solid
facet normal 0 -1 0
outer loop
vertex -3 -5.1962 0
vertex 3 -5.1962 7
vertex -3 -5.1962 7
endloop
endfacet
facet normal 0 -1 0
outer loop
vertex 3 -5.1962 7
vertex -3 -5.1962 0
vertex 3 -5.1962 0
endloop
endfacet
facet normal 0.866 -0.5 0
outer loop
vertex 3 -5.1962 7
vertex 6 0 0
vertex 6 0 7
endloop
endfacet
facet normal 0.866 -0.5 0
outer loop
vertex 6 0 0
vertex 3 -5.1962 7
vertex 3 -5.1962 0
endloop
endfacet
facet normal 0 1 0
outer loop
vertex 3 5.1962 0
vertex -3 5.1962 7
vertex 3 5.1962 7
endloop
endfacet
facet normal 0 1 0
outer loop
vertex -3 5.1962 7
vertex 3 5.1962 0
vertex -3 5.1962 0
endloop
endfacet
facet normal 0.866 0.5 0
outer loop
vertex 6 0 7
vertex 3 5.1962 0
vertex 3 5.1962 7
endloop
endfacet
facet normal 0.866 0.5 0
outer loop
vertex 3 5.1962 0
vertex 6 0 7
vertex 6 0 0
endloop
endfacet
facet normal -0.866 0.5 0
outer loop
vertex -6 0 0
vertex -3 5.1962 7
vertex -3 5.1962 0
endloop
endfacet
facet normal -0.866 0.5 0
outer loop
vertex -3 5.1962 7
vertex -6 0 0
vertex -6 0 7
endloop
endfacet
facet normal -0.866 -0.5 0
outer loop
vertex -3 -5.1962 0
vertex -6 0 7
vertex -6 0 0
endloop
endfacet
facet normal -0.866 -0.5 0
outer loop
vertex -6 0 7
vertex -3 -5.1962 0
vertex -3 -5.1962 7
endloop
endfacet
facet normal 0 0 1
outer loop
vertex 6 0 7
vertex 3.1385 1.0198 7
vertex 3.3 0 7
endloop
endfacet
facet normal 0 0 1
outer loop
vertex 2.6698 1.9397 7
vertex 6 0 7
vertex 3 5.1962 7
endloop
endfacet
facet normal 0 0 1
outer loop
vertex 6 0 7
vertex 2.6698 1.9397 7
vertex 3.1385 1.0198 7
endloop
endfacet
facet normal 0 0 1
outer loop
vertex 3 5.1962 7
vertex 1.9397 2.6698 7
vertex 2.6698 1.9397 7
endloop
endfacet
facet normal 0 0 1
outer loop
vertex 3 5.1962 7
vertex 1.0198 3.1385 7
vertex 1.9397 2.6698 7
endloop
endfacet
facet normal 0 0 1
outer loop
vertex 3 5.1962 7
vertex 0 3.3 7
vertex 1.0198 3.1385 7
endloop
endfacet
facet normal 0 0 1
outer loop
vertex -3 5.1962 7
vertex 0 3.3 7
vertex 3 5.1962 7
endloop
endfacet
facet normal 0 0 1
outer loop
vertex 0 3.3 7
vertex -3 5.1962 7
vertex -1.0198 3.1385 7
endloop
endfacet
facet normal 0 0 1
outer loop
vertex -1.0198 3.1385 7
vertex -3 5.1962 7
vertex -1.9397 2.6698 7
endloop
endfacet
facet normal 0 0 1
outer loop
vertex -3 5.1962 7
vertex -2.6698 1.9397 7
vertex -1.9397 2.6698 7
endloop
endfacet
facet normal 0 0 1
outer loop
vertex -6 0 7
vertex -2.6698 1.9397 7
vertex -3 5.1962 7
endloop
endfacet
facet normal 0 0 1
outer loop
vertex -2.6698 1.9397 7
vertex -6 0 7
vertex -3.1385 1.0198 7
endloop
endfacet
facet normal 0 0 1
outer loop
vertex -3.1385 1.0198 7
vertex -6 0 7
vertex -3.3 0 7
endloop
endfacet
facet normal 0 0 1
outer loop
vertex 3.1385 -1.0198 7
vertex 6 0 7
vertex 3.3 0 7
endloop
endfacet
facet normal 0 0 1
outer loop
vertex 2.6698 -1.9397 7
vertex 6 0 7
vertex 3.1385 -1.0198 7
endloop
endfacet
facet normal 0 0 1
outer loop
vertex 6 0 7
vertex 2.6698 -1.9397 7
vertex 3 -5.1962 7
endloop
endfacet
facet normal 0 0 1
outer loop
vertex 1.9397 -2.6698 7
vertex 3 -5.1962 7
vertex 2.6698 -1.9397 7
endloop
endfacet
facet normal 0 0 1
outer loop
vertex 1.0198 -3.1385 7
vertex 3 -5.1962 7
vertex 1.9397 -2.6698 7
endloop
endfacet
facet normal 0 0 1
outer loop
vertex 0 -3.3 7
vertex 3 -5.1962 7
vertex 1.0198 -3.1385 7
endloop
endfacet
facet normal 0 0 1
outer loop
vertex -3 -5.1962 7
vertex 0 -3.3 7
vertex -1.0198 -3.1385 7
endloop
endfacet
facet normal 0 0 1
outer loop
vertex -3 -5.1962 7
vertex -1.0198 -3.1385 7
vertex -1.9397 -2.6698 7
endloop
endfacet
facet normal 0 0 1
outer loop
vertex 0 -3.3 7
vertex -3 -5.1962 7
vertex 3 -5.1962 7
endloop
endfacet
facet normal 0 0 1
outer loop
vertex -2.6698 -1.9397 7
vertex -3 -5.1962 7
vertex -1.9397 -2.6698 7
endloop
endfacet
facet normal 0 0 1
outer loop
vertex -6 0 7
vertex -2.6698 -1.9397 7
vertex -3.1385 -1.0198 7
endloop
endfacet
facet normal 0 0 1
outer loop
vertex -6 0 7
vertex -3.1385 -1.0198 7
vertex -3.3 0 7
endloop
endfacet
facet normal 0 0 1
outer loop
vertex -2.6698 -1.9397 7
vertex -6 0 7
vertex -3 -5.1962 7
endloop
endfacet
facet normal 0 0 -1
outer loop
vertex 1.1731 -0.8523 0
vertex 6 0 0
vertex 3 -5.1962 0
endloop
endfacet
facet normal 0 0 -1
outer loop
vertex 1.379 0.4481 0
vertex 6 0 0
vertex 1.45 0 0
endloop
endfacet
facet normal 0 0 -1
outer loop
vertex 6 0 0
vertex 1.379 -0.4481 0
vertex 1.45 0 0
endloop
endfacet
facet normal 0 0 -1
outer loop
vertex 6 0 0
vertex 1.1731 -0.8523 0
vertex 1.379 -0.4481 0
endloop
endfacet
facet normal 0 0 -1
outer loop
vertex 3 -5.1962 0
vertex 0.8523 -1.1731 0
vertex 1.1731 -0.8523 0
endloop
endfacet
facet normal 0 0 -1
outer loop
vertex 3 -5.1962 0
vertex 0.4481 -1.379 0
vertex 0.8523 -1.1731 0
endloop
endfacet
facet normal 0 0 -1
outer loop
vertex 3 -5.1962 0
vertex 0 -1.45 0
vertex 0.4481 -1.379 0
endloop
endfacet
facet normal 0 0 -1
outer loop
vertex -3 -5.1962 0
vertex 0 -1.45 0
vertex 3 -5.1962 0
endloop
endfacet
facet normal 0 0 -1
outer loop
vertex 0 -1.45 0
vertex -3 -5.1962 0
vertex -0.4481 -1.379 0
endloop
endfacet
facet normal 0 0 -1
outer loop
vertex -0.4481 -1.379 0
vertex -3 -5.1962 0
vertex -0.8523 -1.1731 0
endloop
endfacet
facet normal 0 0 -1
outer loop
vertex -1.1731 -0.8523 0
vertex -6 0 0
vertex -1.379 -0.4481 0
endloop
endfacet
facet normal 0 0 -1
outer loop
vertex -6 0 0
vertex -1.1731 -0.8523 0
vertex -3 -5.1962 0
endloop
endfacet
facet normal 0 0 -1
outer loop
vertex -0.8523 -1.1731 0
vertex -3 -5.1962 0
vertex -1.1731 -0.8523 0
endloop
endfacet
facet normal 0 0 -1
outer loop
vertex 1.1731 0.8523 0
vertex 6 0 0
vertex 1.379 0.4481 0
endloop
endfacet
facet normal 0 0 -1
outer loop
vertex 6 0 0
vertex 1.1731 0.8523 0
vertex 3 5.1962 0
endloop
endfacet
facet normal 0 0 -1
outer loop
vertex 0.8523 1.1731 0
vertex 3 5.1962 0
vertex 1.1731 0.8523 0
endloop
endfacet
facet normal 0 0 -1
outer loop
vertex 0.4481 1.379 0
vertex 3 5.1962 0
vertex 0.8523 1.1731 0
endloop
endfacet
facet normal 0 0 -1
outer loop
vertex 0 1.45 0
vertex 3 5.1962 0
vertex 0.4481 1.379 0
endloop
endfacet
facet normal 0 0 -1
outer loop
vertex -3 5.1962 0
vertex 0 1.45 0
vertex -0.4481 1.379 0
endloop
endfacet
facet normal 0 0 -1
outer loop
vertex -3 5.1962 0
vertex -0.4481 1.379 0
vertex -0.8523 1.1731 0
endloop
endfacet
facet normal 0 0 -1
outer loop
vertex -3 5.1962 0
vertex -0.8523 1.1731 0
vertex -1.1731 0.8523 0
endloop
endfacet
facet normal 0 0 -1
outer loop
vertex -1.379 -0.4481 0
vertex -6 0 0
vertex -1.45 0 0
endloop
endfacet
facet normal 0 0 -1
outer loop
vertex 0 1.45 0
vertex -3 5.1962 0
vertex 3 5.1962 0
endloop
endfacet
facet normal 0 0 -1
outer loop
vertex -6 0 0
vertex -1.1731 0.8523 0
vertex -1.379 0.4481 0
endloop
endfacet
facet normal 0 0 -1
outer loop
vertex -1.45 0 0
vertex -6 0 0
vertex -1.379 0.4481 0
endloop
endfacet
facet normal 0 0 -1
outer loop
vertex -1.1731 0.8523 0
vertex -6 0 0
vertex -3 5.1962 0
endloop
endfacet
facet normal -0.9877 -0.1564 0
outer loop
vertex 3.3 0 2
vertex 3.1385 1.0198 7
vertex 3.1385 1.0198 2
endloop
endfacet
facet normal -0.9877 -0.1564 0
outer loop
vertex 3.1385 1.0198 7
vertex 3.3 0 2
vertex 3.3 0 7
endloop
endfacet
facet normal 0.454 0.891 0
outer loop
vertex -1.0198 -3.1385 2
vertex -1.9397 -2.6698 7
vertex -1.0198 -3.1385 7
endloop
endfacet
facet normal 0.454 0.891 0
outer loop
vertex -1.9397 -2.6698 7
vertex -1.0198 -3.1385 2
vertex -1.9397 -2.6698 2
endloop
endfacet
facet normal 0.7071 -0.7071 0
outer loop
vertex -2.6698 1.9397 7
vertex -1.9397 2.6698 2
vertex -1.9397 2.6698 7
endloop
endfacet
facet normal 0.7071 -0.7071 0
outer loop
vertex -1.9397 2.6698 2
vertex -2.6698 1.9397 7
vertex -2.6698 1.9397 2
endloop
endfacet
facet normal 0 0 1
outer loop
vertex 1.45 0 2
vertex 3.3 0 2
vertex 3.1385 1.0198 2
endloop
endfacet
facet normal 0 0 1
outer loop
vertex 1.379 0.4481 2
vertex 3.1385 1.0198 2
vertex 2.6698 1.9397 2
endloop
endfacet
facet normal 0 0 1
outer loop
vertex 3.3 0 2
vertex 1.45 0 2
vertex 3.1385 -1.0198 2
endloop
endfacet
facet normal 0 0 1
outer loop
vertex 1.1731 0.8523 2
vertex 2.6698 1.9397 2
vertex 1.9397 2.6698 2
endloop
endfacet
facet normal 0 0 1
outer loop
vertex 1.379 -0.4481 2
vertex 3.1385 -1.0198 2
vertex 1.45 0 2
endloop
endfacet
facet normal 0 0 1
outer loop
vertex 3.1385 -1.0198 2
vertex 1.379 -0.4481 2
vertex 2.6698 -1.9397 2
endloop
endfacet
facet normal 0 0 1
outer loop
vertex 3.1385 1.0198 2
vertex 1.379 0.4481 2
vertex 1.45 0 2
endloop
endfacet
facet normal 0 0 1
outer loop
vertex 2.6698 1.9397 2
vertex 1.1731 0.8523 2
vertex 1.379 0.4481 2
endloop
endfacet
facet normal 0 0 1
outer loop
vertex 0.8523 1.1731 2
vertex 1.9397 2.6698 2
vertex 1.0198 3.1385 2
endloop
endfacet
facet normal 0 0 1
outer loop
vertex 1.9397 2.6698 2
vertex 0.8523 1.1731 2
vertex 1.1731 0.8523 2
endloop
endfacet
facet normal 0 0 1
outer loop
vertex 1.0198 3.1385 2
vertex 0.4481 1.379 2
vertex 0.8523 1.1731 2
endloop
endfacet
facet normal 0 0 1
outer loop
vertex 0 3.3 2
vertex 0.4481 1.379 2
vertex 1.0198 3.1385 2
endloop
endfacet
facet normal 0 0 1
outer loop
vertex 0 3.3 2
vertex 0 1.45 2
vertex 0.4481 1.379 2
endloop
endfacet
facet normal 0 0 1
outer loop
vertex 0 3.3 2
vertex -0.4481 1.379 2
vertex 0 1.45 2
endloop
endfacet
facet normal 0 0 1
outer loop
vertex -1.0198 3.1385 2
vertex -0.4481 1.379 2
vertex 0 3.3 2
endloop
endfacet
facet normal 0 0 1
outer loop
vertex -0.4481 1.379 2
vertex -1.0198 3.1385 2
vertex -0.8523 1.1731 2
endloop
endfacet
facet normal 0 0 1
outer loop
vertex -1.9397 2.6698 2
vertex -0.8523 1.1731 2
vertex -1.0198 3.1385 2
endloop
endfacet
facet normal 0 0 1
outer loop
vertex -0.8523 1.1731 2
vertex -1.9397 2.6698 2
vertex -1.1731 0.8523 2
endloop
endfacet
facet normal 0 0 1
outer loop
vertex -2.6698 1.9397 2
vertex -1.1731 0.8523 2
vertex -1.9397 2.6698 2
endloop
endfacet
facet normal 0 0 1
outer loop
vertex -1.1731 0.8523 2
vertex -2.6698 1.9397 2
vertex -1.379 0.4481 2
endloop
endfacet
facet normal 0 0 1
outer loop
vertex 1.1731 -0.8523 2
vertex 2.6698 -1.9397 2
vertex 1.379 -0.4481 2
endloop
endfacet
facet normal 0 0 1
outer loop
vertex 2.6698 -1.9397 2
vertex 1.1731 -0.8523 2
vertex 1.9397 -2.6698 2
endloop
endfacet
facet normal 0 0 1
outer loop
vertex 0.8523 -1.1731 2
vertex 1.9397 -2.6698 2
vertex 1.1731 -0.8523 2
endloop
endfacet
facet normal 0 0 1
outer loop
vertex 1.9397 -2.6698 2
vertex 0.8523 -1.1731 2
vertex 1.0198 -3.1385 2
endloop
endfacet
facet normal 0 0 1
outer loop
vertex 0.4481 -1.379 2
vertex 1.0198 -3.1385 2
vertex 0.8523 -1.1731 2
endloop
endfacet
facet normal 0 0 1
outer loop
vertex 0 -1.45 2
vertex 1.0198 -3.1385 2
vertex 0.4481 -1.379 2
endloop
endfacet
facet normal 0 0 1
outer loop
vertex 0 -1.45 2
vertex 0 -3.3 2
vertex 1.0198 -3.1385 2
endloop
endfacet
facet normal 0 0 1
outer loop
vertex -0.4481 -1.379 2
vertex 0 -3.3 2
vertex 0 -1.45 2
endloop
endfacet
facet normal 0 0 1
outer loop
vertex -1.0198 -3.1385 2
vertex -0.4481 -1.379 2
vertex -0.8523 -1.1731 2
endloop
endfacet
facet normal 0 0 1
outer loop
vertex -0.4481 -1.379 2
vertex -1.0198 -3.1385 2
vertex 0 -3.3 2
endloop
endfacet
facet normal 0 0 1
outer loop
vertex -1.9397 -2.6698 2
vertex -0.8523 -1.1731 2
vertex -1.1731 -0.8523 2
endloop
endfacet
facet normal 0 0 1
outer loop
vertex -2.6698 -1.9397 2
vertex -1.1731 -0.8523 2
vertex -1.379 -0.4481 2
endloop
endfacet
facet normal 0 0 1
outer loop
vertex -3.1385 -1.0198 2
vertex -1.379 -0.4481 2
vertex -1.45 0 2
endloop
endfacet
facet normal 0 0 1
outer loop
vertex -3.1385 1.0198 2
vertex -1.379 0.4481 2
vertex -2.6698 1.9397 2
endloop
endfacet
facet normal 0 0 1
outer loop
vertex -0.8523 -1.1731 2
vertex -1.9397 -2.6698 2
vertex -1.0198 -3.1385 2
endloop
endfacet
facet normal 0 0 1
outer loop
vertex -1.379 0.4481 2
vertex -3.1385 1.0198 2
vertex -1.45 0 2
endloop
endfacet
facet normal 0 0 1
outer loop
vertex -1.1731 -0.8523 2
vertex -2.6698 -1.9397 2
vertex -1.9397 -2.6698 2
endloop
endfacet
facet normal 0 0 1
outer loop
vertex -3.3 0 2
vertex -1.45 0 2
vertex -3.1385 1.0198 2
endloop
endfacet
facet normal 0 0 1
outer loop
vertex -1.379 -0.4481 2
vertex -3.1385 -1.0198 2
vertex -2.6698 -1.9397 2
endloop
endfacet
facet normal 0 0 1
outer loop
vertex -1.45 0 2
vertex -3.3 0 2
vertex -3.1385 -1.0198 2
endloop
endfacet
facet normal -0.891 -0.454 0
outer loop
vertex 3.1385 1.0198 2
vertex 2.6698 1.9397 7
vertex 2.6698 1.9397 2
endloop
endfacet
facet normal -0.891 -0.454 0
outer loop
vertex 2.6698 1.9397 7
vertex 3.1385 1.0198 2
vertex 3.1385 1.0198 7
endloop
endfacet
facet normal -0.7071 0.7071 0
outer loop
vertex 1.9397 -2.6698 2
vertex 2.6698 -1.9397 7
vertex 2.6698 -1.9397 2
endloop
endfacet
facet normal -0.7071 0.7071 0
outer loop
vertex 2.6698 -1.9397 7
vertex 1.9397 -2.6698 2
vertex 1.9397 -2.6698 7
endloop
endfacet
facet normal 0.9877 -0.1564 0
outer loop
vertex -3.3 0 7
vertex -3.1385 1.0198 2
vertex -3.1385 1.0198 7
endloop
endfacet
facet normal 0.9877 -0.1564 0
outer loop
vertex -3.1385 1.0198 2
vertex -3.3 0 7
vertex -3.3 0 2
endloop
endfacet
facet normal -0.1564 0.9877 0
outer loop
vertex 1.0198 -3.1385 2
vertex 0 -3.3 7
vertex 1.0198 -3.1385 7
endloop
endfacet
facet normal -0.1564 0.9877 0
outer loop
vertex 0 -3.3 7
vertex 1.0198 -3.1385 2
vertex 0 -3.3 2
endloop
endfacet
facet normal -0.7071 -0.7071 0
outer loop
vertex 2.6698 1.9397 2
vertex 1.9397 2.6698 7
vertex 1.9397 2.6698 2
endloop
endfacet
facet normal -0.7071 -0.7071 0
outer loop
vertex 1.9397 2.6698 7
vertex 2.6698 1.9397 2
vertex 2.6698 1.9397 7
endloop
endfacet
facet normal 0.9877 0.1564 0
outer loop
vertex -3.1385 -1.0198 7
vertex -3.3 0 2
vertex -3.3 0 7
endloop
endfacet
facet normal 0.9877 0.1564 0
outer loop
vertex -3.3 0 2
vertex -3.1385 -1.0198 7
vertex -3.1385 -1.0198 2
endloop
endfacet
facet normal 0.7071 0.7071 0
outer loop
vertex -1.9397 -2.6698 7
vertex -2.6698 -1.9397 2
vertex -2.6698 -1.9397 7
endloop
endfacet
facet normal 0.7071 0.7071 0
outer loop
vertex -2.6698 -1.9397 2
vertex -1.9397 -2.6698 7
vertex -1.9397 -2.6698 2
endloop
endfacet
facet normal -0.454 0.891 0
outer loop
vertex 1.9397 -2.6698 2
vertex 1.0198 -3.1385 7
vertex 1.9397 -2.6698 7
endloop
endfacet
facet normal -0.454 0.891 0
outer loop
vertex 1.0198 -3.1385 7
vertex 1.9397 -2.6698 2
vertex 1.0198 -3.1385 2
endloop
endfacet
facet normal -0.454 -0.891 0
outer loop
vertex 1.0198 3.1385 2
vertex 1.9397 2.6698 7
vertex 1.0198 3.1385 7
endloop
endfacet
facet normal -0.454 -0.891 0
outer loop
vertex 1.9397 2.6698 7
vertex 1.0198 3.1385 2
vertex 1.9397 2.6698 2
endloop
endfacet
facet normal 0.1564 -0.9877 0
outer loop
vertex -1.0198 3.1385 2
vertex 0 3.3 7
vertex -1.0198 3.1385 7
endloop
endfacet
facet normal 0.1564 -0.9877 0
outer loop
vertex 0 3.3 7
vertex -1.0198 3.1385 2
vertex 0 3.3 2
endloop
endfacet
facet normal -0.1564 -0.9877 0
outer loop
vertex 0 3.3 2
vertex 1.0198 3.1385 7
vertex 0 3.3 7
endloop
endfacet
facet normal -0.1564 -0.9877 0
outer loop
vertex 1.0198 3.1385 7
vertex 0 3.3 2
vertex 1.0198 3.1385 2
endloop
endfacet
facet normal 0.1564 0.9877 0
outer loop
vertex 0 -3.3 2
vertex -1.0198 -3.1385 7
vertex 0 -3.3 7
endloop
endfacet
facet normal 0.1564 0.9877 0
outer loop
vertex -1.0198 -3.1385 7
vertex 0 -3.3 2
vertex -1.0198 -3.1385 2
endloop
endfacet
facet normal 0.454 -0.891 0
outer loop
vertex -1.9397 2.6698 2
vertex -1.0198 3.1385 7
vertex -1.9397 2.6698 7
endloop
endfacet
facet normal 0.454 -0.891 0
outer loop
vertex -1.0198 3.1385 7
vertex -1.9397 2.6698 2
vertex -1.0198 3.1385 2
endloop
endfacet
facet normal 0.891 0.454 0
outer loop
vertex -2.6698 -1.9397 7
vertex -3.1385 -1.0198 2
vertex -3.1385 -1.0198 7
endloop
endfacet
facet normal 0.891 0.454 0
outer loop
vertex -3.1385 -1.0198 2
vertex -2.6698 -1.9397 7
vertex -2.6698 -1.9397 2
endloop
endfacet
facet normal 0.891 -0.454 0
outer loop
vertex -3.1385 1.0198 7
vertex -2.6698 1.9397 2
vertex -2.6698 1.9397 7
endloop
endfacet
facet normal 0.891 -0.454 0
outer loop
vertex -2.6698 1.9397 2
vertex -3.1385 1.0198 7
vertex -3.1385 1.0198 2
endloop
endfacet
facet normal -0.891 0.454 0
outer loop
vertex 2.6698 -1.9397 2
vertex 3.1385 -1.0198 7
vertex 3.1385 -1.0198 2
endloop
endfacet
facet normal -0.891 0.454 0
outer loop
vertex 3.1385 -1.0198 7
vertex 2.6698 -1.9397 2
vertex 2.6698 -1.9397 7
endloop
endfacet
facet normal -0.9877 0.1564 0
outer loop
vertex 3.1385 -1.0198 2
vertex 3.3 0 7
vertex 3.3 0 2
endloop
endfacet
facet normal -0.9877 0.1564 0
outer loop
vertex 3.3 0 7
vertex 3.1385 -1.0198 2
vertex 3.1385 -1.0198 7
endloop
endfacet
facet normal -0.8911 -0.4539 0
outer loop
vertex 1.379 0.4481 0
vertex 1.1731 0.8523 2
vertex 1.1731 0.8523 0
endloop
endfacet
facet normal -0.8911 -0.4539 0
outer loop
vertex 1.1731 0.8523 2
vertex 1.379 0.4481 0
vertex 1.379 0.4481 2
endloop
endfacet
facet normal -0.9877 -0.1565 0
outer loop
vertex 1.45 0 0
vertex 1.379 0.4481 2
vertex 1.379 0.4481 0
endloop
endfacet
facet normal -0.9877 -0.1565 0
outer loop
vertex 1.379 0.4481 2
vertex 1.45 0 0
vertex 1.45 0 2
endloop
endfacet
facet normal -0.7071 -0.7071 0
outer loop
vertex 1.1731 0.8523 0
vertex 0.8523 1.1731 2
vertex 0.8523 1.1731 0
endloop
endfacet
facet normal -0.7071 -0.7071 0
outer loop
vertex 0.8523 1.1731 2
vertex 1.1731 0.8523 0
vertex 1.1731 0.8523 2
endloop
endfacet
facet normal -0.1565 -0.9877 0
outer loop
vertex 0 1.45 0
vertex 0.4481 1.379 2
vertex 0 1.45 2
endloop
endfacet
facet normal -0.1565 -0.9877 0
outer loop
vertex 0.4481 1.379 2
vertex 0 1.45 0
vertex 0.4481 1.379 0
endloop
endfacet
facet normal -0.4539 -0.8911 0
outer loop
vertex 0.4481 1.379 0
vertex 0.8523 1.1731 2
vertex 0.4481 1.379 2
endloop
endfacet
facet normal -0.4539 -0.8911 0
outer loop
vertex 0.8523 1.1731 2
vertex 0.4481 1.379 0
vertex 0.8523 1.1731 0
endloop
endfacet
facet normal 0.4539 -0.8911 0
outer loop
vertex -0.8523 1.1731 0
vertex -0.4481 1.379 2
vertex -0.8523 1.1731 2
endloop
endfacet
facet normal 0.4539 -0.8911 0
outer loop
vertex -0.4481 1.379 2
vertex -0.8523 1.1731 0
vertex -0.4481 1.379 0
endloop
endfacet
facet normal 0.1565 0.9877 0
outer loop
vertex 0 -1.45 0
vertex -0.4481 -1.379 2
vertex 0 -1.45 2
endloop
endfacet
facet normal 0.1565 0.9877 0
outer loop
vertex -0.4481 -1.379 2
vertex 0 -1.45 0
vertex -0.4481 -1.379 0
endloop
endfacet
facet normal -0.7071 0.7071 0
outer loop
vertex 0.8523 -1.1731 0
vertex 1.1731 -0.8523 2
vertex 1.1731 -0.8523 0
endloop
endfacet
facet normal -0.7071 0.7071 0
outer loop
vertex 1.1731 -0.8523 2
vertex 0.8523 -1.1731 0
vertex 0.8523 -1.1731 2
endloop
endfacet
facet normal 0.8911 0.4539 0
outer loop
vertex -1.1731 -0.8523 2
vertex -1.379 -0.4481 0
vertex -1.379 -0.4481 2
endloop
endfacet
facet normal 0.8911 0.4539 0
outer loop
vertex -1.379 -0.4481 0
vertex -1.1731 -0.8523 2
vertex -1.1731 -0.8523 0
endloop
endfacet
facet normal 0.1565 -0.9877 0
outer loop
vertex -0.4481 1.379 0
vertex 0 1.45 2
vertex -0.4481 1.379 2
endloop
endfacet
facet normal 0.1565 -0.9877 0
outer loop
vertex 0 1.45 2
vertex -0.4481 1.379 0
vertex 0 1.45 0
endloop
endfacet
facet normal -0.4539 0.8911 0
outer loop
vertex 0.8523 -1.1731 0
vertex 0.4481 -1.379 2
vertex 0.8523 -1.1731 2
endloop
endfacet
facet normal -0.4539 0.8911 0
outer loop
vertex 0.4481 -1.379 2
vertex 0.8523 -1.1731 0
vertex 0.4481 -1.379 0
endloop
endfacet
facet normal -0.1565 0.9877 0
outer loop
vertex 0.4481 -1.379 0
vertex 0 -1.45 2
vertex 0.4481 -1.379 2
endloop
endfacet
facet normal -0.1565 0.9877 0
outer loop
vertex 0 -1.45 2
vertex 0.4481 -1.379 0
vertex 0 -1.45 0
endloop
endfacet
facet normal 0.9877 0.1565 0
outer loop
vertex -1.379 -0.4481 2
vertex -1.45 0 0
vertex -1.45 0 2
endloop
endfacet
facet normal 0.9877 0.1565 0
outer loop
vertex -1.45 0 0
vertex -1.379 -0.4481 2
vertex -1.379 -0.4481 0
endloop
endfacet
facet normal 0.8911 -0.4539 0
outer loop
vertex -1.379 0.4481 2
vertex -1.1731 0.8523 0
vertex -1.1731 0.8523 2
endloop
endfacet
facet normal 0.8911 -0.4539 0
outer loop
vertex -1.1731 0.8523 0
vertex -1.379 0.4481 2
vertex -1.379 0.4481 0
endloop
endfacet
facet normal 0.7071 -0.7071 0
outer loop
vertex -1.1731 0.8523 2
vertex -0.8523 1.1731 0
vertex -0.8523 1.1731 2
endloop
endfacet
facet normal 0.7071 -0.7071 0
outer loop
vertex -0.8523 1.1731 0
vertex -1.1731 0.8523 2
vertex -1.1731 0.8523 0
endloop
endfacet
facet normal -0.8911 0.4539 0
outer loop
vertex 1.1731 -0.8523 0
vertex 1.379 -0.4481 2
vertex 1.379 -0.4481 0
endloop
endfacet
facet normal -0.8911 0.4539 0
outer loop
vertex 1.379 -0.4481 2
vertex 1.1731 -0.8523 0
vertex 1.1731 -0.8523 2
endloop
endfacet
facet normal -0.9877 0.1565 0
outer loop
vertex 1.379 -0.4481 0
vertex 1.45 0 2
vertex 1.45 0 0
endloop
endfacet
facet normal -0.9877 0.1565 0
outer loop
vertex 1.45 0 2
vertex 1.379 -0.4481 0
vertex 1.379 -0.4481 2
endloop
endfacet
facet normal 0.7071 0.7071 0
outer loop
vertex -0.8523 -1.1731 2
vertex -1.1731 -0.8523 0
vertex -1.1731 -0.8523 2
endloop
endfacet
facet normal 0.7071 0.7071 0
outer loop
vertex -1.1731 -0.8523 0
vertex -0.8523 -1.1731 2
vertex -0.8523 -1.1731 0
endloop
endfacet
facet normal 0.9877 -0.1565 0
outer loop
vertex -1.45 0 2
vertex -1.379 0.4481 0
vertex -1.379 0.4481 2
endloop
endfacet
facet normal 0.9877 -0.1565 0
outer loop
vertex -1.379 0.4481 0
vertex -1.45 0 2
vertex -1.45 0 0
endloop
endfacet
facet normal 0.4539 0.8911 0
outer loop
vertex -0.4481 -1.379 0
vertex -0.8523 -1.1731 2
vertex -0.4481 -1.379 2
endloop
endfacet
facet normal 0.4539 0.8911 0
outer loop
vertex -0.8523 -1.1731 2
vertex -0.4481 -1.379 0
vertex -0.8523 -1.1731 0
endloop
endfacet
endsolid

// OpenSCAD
$fn = 20;
screwD = 2.9;

difference(){
	cylinder(r = 6, h = 7, $fn = 6);
	translate([0, 0, 2])
	cylinder(r = 3.3, h = 5);	
	cylinder(r = screwD/2, 2);
}
